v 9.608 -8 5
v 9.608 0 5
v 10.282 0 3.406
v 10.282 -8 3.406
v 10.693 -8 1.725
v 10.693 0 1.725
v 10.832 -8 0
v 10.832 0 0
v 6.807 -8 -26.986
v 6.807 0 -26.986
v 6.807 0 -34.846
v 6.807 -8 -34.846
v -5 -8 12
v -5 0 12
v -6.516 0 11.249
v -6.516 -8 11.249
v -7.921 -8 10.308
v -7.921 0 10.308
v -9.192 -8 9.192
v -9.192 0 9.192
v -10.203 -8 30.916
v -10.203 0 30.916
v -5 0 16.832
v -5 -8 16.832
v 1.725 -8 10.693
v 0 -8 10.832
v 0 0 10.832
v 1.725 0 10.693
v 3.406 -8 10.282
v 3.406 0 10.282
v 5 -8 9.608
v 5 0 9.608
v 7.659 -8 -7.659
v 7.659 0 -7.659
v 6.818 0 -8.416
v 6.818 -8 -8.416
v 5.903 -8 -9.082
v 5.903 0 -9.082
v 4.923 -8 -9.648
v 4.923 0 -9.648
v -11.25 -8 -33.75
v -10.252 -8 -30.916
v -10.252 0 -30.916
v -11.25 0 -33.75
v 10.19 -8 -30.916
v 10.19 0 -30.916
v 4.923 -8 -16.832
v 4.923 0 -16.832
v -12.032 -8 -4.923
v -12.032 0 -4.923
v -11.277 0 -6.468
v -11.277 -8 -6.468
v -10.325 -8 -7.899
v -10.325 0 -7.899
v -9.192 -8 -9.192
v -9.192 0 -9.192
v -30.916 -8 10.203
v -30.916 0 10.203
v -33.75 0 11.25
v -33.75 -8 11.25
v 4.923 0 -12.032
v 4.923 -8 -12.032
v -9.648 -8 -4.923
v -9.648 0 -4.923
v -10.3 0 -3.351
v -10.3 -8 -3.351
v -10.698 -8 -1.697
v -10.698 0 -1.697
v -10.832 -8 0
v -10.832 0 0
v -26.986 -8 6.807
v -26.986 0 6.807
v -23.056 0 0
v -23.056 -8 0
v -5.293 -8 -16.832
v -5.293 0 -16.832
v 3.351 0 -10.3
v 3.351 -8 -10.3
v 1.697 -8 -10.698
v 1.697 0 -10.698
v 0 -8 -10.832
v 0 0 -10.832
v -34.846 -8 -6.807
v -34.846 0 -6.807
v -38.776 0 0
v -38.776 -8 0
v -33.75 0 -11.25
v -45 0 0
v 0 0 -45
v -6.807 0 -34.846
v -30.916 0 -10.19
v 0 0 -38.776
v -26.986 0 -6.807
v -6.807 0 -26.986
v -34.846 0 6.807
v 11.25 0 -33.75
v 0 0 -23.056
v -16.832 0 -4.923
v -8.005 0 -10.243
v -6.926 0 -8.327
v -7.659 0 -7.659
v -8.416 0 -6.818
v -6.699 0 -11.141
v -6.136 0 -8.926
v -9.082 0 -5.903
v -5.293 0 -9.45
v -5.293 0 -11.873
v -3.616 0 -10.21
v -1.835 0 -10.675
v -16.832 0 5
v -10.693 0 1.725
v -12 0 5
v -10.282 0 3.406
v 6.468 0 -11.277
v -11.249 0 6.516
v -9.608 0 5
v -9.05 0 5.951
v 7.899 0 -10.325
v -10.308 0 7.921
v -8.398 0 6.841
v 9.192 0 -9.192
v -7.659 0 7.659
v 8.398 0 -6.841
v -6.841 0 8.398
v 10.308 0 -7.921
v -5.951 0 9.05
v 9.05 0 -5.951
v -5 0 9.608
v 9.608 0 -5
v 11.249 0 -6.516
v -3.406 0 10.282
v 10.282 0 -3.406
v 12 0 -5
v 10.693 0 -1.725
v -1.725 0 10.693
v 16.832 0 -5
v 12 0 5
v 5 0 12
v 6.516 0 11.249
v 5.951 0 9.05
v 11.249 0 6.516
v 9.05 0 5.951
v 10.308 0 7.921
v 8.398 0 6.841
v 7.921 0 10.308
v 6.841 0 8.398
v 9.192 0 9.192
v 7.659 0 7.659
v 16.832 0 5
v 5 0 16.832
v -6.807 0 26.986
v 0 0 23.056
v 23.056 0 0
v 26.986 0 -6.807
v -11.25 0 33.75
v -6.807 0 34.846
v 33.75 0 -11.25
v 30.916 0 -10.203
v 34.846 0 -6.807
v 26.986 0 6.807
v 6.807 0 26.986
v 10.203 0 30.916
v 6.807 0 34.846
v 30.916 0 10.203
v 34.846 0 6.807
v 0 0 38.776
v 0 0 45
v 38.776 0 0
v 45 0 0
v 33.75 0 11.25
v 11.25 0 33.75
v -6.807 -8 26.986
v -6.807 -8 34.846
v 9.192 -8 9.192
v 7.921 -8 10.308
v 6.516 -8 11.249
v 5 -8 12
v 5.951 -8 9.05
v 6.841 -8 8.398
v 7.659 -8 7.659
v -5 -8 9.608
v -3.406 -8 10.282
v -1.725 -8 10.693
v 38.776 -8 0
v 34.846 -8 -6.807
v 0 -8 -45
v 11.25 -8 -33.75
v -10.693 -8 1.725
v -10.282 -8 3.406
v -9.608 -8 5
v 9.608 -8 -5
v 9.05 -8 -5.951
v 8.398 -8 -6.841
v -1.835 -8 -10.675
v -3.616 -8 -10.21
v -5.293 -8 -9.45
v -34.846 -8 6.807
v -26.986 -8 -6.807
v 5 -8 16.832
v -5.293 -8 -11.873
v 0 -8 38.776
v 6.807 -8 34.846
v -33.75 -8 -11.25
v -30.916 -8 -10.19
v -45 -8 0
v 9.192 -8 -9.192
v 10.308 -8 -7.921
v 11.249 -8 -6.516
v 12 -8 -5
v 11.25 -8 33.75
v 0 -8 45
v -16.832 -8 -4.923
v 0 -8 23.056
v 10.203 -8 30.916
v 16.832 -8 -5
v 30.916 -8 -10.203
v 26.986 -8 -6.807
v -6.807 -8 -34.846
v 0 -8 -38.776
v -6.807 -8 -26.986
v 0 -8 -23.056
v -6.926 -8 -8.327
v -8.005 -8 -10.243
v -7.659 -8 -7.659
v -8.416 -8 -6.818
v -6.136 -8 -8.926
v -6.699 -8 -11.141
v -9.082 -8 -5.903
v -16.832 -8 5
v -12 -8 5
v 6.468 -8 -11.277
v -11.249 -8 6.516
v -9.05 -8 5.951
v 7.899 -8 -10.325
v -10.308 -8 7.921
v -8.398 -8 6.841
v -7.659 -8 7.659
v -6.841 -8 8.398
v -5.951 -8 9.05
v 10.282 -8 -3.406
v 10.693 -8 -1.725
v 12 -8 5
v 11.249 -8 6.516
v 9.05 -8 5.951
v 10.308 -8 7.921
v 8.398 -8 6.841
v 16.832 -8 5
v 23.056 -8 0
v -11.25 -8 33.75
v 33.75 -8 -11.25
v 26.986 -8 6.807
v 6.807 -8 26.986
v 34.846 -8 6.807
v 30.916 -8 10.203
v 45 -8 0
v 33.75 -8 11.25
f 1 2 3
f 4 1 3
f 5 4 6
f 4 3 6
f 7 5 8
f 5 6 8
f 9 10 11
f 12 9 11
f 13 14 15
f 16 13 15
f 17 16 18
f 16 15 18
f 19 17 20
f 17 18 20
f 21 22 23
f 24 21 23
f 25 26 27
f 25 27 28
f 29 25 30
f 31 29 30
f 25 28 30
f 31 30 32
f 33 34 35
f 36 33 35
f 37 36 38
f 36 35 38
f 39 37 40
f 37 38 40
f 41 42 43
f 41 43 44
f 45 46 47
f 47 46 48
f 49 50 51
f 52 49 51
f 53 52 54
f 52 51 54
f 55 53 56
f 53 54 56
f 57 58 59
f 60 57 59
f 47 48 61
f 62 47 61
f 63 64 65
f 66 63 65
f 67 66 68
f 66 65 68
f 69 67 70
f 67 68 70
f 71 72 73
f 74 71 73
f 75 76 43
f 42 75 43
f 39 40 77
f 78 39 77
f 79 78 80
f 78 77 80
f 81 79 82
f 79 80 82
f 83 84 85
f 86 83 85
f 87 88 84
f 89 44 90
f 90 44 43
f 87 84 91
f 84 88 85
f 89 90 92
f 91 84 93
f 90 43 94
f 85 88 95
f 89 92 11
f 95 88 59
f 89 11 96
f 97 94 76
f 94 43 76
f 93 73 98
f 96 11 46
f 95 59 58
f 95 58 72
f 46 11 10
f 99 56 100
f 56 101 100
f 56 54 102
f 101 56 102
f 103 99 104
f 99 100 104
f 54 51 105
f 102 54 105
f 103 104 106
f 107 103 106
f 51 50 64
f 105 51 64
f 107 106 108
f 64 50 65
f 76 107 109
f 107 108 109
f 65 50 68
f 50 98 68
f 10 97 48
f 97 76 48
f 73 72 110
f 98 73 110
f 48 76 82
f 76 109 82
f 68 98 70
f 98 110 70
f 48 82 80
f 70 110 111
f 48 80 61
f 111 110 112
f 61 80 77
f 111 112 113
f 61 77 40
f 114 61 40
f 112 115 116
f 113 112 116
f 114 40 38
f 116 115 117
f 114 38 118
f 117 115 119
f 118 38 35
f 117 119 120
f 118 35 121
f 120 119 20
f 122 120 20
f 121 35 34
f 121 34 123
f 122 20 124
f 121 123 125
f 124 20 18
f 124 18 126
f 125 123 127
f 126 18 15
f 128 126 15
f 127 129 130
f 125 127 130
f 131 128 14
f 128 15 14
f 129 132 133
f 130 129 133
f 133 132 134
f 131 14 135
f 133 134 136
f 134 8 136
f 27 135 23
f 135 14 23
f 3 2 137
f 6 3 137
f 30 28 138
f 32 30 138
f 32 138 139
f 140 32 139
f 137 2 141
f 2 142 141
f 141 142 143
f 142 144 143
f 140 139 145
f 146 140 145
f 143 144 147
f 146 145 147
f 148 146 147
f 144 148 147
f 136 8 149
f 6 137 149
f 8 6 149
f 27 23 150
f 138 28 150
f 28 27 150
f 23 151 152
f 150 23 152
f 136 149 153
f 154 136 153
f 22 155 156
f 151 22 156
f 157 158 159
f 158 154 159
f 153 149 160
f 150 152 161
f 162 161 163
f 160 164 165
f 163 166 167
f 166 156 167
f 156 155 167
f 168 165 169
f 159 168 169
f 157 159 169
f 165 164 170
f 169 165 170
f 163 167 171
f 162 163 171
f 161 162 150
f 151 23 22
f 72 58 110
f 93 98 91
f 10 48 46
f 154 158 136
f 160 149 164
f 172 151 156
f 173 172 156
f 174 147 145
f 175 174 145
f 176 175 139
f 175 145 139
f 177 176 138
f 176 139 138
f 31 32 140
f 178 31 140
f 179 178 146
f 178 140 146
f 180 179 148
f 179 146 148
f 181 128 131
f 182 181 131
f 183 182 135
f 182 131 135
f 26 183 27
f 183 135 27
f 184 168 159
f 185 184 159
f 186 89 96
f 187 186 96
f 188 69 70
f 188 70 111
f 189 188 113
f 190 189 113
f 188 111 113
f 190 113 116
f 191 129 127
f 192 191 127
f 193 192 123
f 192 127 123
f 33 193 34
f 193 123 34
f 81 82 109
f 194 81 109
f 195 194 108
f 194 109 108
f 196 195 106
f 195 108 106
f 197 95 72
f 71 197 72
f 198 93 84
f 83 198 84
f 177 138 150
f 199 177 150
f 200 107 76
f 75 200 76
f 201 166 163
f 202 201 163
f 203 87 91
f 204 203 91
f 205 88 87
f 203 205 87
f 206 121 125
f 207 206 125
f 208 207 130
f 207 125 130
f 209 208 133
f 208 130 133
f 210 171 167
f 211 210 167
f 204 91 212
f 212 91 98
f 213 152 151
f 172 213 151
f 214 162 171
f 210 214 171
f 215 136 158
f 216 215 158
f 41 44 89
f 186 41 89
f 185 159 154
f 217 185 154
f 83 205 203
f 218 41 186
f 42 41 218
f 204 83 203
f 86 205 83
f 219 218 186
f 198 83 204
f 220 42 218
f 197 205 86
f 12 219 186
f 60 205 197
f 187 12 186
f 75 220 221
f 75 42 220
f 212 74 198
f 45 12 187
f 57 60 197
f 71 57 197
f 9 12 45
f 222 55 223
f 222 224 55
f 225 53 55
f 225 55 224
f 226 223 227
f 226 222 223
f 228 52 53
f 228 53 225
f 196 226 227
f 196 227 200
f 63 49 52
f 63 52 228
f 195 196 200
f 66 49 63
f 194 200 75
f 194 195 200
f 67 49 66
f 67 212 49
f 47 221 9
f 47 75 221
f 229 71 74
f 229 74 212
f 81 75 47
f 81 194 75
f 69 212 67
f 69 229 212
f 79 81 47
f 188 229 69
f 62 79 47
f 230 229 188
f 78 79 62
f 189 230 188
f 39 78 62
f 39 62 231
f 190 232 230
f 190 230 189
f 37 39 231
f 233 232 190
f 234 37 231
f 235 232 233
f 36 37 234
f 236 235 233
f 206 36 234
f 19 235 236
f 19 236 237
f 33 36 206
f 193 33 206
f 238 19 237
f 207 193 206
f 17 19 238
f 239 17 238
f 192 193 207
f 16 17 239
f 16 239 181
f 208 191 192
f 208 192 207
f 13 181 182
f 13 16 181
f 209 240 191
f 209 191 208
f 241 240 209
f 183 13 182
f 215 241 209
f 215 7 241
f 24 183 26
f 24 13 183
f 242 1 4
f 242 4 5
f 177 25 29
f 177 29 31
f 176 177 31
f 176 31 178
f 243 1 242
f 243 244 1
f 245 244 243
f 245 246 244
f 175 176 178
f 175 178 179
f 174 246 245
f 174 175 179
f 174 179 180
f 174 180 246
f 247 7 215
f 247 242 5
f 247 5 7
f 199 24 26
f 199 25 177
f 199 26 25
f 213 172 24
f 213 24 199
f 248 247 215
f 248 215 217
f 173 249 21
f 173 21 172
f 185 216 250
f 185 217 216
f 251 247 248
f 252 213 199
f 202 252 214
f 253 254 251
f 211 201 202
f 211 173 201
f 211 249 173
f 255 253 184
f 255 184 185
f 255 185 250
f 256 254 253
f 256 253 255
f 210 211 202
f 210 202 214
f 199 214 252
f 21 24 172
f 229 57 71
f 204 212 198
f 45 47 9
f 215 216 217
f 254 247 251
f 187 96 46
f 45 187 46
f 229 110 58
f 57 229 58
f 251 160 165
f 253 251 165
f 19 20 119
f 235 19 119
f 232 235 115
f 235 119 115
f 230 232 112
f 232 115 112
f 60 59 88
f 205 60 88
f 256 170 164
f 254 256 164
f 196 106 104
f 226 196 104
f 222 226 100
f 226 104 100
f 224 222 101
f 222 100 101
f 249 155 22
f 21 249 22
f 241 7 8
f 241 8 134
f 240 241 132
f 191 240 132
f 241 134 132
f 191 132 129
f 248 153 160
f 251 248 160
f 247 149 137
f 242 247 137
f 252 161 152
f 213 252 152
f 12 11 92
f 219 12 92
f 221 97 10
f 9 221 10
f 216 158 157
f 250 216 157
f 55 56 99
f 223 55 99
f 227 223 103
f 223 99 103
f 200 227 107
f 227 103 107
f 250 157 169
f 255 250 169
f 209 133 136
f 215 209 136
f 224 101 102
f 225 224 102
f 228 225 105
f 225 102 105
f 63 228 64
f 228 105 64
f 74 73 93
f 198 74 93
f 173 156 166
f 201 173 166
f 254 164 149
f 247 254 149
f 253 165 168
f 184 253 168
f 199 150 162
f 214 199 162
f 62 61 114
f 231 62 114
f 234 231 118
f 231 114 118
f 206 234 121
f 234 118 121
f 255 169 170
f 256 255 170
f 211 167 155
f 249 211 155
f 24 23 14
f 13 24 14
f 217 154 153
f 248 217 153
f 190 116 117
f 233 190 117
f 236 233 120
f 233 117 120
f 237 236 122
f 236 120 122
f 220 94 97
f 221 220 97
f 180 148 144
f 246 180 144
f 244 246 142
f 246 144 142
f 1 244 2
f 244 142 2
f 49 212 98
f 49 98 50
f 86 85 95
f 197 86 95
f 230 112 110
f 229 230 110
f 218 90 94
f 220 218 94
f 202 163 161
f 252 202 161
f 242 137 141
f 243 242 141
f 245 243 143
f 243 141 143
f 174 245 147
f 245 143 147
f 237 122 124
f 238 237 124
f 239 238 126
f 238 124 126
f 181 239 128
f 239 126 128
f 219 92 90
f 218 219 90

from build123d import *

# Parameters (mm, degrees)
F1_DEPTH = 8


with BuildPart() as f1:
    # F0 (on Front) → F1 (new body)
    with BuildSketch(Plane.XZ):
        Polygon((0, 23.0557063947), (0, 16.8315059189), (5, 16.8315059189), (10.202977498, 30.9157529595), (6.807, 30.9157529595), (6.807, 26.9857296771), align=None)
        Polygon((10.202977498, 30.9157529595), (11.25, 33.75), (0, 45), (0, 38.7757995242), (6.807, 34.8457762418), (6.807, 30.9157529595), align=None)
        Polygon((-5, 16.8315059189), (0, 16.8315059189), (0, 23.0557063947), (-6.807, 26.9857296771), (-6.807, 30.9157529595), (-10.202977498, 30.9157529595), align=None)
        Polygon((0, 45), (-11.25, 33.75), (-10.202977498, 30.9157529595), (-6.807, 30.9157529595), (-6.807, 34.8457762418), (0, 38.7757995242), align=None)
        Polygon((4.9234117813, -16.8315059189), (0, -16.8315059189), (0, -23.0557063947), (6.807, -26.9857296771), (6.807, -30.9157529595), (10.1901471638, -30.9157529595), align=None)
        Polygon((0, -45), (11.25, -33.75), (10.1901471638, -30.9157529595), (6.807, -30.9157529595), (6.807, -34.8457762418), (0, -38.7757995242), align=None)
        Polygon((0, -23.0557063947), (0, -16.8315059189), (-5.2934198313, -16.8315059189), (-10.2521322445, -30.9157529595), (-6.807, -30.9157529595), (-6.807, -26.9857296771), align=None)
        Polygon((-10.2521322445, -30.9157529595), (-11.25, -33.75), (0, -45), (0, -38.7757995242), (-6.807, -34.8457762418), (-6.807, -30.9157529595), align=None)
        Polygon((23.0557063947, 0), (16.8315059189, 0), (16.8315059189, -5), (30.9157529595, -10.202977498), (30.9157529595, -6.807), (26.9857296771, -6.807), align=None)
        Polygon((30.9157529595, -6.807), (30.9157529595, -10.202977498), (33.75, -11.25), (45, 0), (38.7757995242, 0), (34.8457762418, -6.807), align=None)
        Polygon((16.8315059189, 5), (16.8315059189, 0), (23.0557063947, 0), (26.9857296771, 6.807), (30.9157529595, 6.807), (30.9157529595, 10.202977498), align=None)
        Polygon((33.75, 11.25), (30.9157529595, 10.202977498), (30.9157529595, 6.807), (34.8457762418, 6.807), (38.7757995242, 0), (45, 0), align=None)
        Polygon((-23.0557063947, 0), (-16.8315059189, 0), (-16.8315059189, 5), (-30.9157529595, 10.202977498), (-30.9157529595, 6.807), (-26.9857296771, 6.807), align=None)
        Polygon((-30.9157529595, 10.202977498), (-33.75, 11.25), (-45, 0), (-38.7757995242, 0), (-34.8457762418, 6.807), (-30.9157529595, 6.807), align=None)
        Polygon((-16.8315059189, -4.9234117813), (-16.8315059189, 0), (-23.0557063947, 0), (-26.9857296771, -6.807), (-30.9157529595, -6.807), (-30.9157529595, -10.1901471638), align=None)
        Polygon((-45, 0), (-33.75, -11.25), (-30.9157529595, -10.1901471638), (-30.9157529595, -6.807), (-34.8457762418, -6.807), (-38.7757995242, 0), align=None)
        with BuildLine():
            Line((0, -16.8315059189), (0, -13))
            ThreePointArc((0, -13), (-2.7059805904, -12.7152534007), (-5.2934198313, -11.8734875453))
            Line((-5.2934198313, -11.8734875453), (-5.2934198313, -16.8315059189))
            Line((-5.2934198313, -16.8315059189), (0, -16.8315059189))
        make_face()
        with BuildLine():
            ThreePointArc((4.9234117813, -12.031625677), (2.5088708814, -12.7556092328), (0, -13))
            Line((0, -13), (0, -16.8315059189))
            Line((0, -16.8315059189), (4.9234117813, -16.8315059189))
            Line((4.9234117813, -16.8315059189), (4.9234117813, -12.031625677))
        make_face()
        with BuildLine():
            ThreePointArc((4.9234117813, -9.6478773263), (2.5318451875, -10.5314424662), (0, -10.8315059189))
            Line((0, -10.8315059189), (0, -13))
            ThreePointArc((0, -13), (2.5088708814, -12.7556092328), (4.9234117813, -12.031625677))
            Line((4.9234117813, -12.031625677), (4.9234117813, -9.6478773263))
        make_face()
        with BuildLine():
            Line((0, -13), (0, -10.8315059189))
            ThreePointArc((0, -10.8315059189), (-2.7353719229, -10.4804227451), (-5.2934198313, -9.4499326432))
            Line((-5.2934198313, -9.4499326432), (-5.2934198313, -11.8734875453))
            ThreePointArc((-5.2934198313, -11.8734875453), (-2.7059805904, -12.7152534007), (0, -13))
        make_face()
        with BuildLine():
            ThreePointArc((-5.2934198313, -9.4499326432), (-6.5378382821, -8.63586655), (-7.6590312857, -7.6590312857))
            Line((-7.6590312857, -7.6590312857), (-9.1923881554, -9.1923881554))
            ThreePointArc((-9.1923881554, -9.1923881554), (-7.3659168976, -10.7118284274), (-5.2934198313, -11.8734875453))
            Line((-5.2934198313, -11.8734875453), (-5.2934198313, -9.4499326432))
        make_face()
        with BuildLine():
            Line((-9.1923881554, -9.1923881554), (-7.6590312857, -7.6590312857))
            ThreePointArc((-7.6590312857, -7.6590312857), (-8.7608889358, -6.3693284989), (-9.6478773263, -4.9234117813))
            Line((-9.6478773263, -4.9234117813), (-12.031625677, -4.9234117813))
            ThreePointArc((-12.031625677, -4.9234117813), (-10.8245429747, -7.1992547802), (-9.1923881554, -9.1923881554))
        make_face()
        with BuildLine():
            ThreePointArc((-9.6478773263, -4.9234117813), (-10.5314424662, -2.5318451875), (-10.8315059189, 0))
            Line((-10.8315059189, 0), (-13, 0))
            ThreePointArc((-13, 0), (-12.7556092328, -2.5088708814), (-12.031625677, -4.9234117813))
            Line((-12.031625677, -4.9234117813), (-9.6478773263, -4.9234117813))
        make_face()
        with BuildLine():
            ThreePointArc((-12.031625677, -4.9234117813), (-12.7556092328, -2.5088708814), (-13, 0))
            Line((-13, 0), (-16.8315059189, 0))
            Line((-16.8315059189, 0), (-16.8315059189, -4.9234117813))
            Line((-16.8315059189, -4.9234117813), (-12.031625677, -4.9234117813))
        make_face()
        with BuildLine():
            Line((-16.8315059189, 0), (-13, 0))
            ThreePointArc((-13, 0), (-12.747548784, 2.5495097568), (-12, 5))
            Line((-12, 5), (-16.8315059189, 5))
            Line((-16.8315059189, 5), (-16.8315059189, 0))
        make_face()
        with BuildLine():
            Line((-13, 0), (-10.8315059189, 0))
            ThreePointArc((-10.8315059189, 0), (-10.5212893153, 2.5737116418), (-9.6084088418, 5))
            Line((-9.6084088418, 5), (-12, 5))
            ThreePointArc((-12, 5), (-12.747548784, 2.5495097568), (-13, 0))
        make_face()
        with BuildLine():
            ThreePointArc((-9.6084088418, 5), (-8.7354870491, 6.4041226165), (-7.6590312857, 7.6590312857))
            Line((-7.6590312857, 7.6590312857), (-9.1923881554, 9.1923881554))
            ThreePointArc((-9.1923881554, 9.1923881554), (-10.8015442666, 7.2337156051), (-12, 5))
            Line((-12, 5), (-9.6084088418, 5))
        make_face()
        with BuildLine():
            Line((-9.1923881554, 9.1923881554), (-7.6590312857, 7.6590312857))
            ThreePointArc((-7.6590312857, 7.6590312857), (-6.4041226165, 8.7354870491), (-5, 9.6084088418))
            Line((-5, 9.6084088418), (-5, 12))
            ThreePointArc((-5, 12), (-7.2337156051, 10.8015442666), (-9.1923881554, 9.1923881554))
        make_face()
        with BuildLine():
            Line((0, 16.8315059189), (0, 13))
            ThreePointArc((0, 13), (2.5495097568, 12.747548784), (5, 12))
            Line((5, 12), (5, 16.8315059189))
            Line((5, 16.8315059189), (0, 16.8315059189))
        make_face()
        with BuildLine():
            ThreePointArc((-5, 9.6084088418), (-2.5737116418, 10.5212893153), (0, 10.8315059189))
            Line((0, 10.8315059189), (0, 13))
            ThreePointArc((0, 13), (-2.5495097568, 12.747548784), (-5, 12))
            Line((-5, 12), (-5, 9.6084088418))
        make_face()
        with BuildLine():
            Line((0, 13), (0, 10.8315059189))
            ThreePointArc((0, 10.8315059189), (2.5737116418, 10.5212893153), (5, 9.6084088418))
            Line((5, 9.6084088418), (5, 12))
            ThreePointArc((5, 12), (2.5495097568, 12.747548784), (0, 13))
        make_face()
        with BuildLine():
            ThreePointArc((5, 9.6084088418), (6.4041226165, 8.7354870491), (7.6590312857, 7.6590312857))
            Line((7.6590312857, 7.6590312857), (9.1923881554, 9.1923881554))
            ThreePointArc((9.1923881554, 9.1923881554), (7.2337156051, 10.8015442666), (5, 12))
            Line((5, 12), (5, 9.6084088418))
        make_face()
        with BuildLine():
            ThreePointArc((7.6590312857, 7.6590312857), (8.7354870491, 6.4041226165), (9.6084088418, 5))
            Line((9.6084088418, 5), (12, 5))
            ThreePointArc((12, 5), (10.8015442666, 7.2337156051), (9.1923881554, 9.1923881554))
            Line((9.1923881554, 9.1923881554), (7.6590312857, 7.6590312857))
        make_face()
        with BuildLine():
            ThreePointArc((9.6084088418, 5), (10.5212893153, 2.5737116418), (10.8315059189, 0))
            Line((10.8315059189, 0), (13, 0))
            ThreePointArc((13, 0), (12.747548784, 2.5495097568), (12, 5))
            Line((12, 5), (9.6084088418, 5))
        make_face()
        with BuildLine():
            Line((9.1923881554, -9.1923881554), (7.6590312857, -7.6590312857))
            ThreePointArc((7.6590312857, -7.6590312857), (6.3693284989, -8.7608889358), (4.9234117813, -9.6478773263))
            Line((4.9234117813, -9.6478773263), (4.9234117813, -12.031625677))
            ThreePointArc((4.9234117813, -12.031625677), (7.1992547802, -10.8245429747), (9.1923881554, -9.1923881554))
        make_face()
        with BuildLine():
            ThreePointArc((12, 5), (12.747548784, 2.5495097568), (13, 0))
            Line((13, 0), (16.8315059189, 0))
            Line((16.8315059189, 0), (16.8315059189, 5))
            Line((16.8315059189, 5), (12, 5))
        make_face()
        with BuildLine():
            ThreePointArc((-5, 12), (-2.5495097568, 12.747548784), (0, 13))
            Line((0, 13), (0, 16.8315059189))
            Line((0, 16.8315059189), (-5, 16.8315059189))
            Line((-5, 16.8315059189), (-5, 12))
        make_face()
        with BuildLine():
            Line((16.8315059189, 0), (13, 0))
            ThreePointArc((13, 0), (12.747548784, -2.5495097568), (12, -5))
            Line((12, -5), (16.8315059189, -5))
            Line((16.8315059189, -5), (16.8315059189, 0))
        make_face()
        with BuildLine():
            Line((13, 0), (10.8315059189, 0))
            ThreePointArc((10.8315059189, 0), (10.5212893153, -2.5737116418), (9.6084088418, -5))
            Line((9.6084088418, -5), (12, -5))
            ThreePointArc((12, -5), (12.747548784, -2.5495097568), (13, 0))
        make_face()
        with BuildLine():
            Line((12, -5), (9.6084088418, -5))
            ThreePointArc((9.6084088418, -5), (8.7354870491, -6.4041226165), (7.6590312857, -7.6590312857))
            Line((7.6590312857, -7.6590312857), (9.1923881554, -9.1923881554))
            ThreePointArc((9.1923881554, -9.1923881554), (10.8015442666, -7.2337156051), (12, -5))
        make_face()
    extrude(amount=F1_DEPTH)


solid = f1.part
